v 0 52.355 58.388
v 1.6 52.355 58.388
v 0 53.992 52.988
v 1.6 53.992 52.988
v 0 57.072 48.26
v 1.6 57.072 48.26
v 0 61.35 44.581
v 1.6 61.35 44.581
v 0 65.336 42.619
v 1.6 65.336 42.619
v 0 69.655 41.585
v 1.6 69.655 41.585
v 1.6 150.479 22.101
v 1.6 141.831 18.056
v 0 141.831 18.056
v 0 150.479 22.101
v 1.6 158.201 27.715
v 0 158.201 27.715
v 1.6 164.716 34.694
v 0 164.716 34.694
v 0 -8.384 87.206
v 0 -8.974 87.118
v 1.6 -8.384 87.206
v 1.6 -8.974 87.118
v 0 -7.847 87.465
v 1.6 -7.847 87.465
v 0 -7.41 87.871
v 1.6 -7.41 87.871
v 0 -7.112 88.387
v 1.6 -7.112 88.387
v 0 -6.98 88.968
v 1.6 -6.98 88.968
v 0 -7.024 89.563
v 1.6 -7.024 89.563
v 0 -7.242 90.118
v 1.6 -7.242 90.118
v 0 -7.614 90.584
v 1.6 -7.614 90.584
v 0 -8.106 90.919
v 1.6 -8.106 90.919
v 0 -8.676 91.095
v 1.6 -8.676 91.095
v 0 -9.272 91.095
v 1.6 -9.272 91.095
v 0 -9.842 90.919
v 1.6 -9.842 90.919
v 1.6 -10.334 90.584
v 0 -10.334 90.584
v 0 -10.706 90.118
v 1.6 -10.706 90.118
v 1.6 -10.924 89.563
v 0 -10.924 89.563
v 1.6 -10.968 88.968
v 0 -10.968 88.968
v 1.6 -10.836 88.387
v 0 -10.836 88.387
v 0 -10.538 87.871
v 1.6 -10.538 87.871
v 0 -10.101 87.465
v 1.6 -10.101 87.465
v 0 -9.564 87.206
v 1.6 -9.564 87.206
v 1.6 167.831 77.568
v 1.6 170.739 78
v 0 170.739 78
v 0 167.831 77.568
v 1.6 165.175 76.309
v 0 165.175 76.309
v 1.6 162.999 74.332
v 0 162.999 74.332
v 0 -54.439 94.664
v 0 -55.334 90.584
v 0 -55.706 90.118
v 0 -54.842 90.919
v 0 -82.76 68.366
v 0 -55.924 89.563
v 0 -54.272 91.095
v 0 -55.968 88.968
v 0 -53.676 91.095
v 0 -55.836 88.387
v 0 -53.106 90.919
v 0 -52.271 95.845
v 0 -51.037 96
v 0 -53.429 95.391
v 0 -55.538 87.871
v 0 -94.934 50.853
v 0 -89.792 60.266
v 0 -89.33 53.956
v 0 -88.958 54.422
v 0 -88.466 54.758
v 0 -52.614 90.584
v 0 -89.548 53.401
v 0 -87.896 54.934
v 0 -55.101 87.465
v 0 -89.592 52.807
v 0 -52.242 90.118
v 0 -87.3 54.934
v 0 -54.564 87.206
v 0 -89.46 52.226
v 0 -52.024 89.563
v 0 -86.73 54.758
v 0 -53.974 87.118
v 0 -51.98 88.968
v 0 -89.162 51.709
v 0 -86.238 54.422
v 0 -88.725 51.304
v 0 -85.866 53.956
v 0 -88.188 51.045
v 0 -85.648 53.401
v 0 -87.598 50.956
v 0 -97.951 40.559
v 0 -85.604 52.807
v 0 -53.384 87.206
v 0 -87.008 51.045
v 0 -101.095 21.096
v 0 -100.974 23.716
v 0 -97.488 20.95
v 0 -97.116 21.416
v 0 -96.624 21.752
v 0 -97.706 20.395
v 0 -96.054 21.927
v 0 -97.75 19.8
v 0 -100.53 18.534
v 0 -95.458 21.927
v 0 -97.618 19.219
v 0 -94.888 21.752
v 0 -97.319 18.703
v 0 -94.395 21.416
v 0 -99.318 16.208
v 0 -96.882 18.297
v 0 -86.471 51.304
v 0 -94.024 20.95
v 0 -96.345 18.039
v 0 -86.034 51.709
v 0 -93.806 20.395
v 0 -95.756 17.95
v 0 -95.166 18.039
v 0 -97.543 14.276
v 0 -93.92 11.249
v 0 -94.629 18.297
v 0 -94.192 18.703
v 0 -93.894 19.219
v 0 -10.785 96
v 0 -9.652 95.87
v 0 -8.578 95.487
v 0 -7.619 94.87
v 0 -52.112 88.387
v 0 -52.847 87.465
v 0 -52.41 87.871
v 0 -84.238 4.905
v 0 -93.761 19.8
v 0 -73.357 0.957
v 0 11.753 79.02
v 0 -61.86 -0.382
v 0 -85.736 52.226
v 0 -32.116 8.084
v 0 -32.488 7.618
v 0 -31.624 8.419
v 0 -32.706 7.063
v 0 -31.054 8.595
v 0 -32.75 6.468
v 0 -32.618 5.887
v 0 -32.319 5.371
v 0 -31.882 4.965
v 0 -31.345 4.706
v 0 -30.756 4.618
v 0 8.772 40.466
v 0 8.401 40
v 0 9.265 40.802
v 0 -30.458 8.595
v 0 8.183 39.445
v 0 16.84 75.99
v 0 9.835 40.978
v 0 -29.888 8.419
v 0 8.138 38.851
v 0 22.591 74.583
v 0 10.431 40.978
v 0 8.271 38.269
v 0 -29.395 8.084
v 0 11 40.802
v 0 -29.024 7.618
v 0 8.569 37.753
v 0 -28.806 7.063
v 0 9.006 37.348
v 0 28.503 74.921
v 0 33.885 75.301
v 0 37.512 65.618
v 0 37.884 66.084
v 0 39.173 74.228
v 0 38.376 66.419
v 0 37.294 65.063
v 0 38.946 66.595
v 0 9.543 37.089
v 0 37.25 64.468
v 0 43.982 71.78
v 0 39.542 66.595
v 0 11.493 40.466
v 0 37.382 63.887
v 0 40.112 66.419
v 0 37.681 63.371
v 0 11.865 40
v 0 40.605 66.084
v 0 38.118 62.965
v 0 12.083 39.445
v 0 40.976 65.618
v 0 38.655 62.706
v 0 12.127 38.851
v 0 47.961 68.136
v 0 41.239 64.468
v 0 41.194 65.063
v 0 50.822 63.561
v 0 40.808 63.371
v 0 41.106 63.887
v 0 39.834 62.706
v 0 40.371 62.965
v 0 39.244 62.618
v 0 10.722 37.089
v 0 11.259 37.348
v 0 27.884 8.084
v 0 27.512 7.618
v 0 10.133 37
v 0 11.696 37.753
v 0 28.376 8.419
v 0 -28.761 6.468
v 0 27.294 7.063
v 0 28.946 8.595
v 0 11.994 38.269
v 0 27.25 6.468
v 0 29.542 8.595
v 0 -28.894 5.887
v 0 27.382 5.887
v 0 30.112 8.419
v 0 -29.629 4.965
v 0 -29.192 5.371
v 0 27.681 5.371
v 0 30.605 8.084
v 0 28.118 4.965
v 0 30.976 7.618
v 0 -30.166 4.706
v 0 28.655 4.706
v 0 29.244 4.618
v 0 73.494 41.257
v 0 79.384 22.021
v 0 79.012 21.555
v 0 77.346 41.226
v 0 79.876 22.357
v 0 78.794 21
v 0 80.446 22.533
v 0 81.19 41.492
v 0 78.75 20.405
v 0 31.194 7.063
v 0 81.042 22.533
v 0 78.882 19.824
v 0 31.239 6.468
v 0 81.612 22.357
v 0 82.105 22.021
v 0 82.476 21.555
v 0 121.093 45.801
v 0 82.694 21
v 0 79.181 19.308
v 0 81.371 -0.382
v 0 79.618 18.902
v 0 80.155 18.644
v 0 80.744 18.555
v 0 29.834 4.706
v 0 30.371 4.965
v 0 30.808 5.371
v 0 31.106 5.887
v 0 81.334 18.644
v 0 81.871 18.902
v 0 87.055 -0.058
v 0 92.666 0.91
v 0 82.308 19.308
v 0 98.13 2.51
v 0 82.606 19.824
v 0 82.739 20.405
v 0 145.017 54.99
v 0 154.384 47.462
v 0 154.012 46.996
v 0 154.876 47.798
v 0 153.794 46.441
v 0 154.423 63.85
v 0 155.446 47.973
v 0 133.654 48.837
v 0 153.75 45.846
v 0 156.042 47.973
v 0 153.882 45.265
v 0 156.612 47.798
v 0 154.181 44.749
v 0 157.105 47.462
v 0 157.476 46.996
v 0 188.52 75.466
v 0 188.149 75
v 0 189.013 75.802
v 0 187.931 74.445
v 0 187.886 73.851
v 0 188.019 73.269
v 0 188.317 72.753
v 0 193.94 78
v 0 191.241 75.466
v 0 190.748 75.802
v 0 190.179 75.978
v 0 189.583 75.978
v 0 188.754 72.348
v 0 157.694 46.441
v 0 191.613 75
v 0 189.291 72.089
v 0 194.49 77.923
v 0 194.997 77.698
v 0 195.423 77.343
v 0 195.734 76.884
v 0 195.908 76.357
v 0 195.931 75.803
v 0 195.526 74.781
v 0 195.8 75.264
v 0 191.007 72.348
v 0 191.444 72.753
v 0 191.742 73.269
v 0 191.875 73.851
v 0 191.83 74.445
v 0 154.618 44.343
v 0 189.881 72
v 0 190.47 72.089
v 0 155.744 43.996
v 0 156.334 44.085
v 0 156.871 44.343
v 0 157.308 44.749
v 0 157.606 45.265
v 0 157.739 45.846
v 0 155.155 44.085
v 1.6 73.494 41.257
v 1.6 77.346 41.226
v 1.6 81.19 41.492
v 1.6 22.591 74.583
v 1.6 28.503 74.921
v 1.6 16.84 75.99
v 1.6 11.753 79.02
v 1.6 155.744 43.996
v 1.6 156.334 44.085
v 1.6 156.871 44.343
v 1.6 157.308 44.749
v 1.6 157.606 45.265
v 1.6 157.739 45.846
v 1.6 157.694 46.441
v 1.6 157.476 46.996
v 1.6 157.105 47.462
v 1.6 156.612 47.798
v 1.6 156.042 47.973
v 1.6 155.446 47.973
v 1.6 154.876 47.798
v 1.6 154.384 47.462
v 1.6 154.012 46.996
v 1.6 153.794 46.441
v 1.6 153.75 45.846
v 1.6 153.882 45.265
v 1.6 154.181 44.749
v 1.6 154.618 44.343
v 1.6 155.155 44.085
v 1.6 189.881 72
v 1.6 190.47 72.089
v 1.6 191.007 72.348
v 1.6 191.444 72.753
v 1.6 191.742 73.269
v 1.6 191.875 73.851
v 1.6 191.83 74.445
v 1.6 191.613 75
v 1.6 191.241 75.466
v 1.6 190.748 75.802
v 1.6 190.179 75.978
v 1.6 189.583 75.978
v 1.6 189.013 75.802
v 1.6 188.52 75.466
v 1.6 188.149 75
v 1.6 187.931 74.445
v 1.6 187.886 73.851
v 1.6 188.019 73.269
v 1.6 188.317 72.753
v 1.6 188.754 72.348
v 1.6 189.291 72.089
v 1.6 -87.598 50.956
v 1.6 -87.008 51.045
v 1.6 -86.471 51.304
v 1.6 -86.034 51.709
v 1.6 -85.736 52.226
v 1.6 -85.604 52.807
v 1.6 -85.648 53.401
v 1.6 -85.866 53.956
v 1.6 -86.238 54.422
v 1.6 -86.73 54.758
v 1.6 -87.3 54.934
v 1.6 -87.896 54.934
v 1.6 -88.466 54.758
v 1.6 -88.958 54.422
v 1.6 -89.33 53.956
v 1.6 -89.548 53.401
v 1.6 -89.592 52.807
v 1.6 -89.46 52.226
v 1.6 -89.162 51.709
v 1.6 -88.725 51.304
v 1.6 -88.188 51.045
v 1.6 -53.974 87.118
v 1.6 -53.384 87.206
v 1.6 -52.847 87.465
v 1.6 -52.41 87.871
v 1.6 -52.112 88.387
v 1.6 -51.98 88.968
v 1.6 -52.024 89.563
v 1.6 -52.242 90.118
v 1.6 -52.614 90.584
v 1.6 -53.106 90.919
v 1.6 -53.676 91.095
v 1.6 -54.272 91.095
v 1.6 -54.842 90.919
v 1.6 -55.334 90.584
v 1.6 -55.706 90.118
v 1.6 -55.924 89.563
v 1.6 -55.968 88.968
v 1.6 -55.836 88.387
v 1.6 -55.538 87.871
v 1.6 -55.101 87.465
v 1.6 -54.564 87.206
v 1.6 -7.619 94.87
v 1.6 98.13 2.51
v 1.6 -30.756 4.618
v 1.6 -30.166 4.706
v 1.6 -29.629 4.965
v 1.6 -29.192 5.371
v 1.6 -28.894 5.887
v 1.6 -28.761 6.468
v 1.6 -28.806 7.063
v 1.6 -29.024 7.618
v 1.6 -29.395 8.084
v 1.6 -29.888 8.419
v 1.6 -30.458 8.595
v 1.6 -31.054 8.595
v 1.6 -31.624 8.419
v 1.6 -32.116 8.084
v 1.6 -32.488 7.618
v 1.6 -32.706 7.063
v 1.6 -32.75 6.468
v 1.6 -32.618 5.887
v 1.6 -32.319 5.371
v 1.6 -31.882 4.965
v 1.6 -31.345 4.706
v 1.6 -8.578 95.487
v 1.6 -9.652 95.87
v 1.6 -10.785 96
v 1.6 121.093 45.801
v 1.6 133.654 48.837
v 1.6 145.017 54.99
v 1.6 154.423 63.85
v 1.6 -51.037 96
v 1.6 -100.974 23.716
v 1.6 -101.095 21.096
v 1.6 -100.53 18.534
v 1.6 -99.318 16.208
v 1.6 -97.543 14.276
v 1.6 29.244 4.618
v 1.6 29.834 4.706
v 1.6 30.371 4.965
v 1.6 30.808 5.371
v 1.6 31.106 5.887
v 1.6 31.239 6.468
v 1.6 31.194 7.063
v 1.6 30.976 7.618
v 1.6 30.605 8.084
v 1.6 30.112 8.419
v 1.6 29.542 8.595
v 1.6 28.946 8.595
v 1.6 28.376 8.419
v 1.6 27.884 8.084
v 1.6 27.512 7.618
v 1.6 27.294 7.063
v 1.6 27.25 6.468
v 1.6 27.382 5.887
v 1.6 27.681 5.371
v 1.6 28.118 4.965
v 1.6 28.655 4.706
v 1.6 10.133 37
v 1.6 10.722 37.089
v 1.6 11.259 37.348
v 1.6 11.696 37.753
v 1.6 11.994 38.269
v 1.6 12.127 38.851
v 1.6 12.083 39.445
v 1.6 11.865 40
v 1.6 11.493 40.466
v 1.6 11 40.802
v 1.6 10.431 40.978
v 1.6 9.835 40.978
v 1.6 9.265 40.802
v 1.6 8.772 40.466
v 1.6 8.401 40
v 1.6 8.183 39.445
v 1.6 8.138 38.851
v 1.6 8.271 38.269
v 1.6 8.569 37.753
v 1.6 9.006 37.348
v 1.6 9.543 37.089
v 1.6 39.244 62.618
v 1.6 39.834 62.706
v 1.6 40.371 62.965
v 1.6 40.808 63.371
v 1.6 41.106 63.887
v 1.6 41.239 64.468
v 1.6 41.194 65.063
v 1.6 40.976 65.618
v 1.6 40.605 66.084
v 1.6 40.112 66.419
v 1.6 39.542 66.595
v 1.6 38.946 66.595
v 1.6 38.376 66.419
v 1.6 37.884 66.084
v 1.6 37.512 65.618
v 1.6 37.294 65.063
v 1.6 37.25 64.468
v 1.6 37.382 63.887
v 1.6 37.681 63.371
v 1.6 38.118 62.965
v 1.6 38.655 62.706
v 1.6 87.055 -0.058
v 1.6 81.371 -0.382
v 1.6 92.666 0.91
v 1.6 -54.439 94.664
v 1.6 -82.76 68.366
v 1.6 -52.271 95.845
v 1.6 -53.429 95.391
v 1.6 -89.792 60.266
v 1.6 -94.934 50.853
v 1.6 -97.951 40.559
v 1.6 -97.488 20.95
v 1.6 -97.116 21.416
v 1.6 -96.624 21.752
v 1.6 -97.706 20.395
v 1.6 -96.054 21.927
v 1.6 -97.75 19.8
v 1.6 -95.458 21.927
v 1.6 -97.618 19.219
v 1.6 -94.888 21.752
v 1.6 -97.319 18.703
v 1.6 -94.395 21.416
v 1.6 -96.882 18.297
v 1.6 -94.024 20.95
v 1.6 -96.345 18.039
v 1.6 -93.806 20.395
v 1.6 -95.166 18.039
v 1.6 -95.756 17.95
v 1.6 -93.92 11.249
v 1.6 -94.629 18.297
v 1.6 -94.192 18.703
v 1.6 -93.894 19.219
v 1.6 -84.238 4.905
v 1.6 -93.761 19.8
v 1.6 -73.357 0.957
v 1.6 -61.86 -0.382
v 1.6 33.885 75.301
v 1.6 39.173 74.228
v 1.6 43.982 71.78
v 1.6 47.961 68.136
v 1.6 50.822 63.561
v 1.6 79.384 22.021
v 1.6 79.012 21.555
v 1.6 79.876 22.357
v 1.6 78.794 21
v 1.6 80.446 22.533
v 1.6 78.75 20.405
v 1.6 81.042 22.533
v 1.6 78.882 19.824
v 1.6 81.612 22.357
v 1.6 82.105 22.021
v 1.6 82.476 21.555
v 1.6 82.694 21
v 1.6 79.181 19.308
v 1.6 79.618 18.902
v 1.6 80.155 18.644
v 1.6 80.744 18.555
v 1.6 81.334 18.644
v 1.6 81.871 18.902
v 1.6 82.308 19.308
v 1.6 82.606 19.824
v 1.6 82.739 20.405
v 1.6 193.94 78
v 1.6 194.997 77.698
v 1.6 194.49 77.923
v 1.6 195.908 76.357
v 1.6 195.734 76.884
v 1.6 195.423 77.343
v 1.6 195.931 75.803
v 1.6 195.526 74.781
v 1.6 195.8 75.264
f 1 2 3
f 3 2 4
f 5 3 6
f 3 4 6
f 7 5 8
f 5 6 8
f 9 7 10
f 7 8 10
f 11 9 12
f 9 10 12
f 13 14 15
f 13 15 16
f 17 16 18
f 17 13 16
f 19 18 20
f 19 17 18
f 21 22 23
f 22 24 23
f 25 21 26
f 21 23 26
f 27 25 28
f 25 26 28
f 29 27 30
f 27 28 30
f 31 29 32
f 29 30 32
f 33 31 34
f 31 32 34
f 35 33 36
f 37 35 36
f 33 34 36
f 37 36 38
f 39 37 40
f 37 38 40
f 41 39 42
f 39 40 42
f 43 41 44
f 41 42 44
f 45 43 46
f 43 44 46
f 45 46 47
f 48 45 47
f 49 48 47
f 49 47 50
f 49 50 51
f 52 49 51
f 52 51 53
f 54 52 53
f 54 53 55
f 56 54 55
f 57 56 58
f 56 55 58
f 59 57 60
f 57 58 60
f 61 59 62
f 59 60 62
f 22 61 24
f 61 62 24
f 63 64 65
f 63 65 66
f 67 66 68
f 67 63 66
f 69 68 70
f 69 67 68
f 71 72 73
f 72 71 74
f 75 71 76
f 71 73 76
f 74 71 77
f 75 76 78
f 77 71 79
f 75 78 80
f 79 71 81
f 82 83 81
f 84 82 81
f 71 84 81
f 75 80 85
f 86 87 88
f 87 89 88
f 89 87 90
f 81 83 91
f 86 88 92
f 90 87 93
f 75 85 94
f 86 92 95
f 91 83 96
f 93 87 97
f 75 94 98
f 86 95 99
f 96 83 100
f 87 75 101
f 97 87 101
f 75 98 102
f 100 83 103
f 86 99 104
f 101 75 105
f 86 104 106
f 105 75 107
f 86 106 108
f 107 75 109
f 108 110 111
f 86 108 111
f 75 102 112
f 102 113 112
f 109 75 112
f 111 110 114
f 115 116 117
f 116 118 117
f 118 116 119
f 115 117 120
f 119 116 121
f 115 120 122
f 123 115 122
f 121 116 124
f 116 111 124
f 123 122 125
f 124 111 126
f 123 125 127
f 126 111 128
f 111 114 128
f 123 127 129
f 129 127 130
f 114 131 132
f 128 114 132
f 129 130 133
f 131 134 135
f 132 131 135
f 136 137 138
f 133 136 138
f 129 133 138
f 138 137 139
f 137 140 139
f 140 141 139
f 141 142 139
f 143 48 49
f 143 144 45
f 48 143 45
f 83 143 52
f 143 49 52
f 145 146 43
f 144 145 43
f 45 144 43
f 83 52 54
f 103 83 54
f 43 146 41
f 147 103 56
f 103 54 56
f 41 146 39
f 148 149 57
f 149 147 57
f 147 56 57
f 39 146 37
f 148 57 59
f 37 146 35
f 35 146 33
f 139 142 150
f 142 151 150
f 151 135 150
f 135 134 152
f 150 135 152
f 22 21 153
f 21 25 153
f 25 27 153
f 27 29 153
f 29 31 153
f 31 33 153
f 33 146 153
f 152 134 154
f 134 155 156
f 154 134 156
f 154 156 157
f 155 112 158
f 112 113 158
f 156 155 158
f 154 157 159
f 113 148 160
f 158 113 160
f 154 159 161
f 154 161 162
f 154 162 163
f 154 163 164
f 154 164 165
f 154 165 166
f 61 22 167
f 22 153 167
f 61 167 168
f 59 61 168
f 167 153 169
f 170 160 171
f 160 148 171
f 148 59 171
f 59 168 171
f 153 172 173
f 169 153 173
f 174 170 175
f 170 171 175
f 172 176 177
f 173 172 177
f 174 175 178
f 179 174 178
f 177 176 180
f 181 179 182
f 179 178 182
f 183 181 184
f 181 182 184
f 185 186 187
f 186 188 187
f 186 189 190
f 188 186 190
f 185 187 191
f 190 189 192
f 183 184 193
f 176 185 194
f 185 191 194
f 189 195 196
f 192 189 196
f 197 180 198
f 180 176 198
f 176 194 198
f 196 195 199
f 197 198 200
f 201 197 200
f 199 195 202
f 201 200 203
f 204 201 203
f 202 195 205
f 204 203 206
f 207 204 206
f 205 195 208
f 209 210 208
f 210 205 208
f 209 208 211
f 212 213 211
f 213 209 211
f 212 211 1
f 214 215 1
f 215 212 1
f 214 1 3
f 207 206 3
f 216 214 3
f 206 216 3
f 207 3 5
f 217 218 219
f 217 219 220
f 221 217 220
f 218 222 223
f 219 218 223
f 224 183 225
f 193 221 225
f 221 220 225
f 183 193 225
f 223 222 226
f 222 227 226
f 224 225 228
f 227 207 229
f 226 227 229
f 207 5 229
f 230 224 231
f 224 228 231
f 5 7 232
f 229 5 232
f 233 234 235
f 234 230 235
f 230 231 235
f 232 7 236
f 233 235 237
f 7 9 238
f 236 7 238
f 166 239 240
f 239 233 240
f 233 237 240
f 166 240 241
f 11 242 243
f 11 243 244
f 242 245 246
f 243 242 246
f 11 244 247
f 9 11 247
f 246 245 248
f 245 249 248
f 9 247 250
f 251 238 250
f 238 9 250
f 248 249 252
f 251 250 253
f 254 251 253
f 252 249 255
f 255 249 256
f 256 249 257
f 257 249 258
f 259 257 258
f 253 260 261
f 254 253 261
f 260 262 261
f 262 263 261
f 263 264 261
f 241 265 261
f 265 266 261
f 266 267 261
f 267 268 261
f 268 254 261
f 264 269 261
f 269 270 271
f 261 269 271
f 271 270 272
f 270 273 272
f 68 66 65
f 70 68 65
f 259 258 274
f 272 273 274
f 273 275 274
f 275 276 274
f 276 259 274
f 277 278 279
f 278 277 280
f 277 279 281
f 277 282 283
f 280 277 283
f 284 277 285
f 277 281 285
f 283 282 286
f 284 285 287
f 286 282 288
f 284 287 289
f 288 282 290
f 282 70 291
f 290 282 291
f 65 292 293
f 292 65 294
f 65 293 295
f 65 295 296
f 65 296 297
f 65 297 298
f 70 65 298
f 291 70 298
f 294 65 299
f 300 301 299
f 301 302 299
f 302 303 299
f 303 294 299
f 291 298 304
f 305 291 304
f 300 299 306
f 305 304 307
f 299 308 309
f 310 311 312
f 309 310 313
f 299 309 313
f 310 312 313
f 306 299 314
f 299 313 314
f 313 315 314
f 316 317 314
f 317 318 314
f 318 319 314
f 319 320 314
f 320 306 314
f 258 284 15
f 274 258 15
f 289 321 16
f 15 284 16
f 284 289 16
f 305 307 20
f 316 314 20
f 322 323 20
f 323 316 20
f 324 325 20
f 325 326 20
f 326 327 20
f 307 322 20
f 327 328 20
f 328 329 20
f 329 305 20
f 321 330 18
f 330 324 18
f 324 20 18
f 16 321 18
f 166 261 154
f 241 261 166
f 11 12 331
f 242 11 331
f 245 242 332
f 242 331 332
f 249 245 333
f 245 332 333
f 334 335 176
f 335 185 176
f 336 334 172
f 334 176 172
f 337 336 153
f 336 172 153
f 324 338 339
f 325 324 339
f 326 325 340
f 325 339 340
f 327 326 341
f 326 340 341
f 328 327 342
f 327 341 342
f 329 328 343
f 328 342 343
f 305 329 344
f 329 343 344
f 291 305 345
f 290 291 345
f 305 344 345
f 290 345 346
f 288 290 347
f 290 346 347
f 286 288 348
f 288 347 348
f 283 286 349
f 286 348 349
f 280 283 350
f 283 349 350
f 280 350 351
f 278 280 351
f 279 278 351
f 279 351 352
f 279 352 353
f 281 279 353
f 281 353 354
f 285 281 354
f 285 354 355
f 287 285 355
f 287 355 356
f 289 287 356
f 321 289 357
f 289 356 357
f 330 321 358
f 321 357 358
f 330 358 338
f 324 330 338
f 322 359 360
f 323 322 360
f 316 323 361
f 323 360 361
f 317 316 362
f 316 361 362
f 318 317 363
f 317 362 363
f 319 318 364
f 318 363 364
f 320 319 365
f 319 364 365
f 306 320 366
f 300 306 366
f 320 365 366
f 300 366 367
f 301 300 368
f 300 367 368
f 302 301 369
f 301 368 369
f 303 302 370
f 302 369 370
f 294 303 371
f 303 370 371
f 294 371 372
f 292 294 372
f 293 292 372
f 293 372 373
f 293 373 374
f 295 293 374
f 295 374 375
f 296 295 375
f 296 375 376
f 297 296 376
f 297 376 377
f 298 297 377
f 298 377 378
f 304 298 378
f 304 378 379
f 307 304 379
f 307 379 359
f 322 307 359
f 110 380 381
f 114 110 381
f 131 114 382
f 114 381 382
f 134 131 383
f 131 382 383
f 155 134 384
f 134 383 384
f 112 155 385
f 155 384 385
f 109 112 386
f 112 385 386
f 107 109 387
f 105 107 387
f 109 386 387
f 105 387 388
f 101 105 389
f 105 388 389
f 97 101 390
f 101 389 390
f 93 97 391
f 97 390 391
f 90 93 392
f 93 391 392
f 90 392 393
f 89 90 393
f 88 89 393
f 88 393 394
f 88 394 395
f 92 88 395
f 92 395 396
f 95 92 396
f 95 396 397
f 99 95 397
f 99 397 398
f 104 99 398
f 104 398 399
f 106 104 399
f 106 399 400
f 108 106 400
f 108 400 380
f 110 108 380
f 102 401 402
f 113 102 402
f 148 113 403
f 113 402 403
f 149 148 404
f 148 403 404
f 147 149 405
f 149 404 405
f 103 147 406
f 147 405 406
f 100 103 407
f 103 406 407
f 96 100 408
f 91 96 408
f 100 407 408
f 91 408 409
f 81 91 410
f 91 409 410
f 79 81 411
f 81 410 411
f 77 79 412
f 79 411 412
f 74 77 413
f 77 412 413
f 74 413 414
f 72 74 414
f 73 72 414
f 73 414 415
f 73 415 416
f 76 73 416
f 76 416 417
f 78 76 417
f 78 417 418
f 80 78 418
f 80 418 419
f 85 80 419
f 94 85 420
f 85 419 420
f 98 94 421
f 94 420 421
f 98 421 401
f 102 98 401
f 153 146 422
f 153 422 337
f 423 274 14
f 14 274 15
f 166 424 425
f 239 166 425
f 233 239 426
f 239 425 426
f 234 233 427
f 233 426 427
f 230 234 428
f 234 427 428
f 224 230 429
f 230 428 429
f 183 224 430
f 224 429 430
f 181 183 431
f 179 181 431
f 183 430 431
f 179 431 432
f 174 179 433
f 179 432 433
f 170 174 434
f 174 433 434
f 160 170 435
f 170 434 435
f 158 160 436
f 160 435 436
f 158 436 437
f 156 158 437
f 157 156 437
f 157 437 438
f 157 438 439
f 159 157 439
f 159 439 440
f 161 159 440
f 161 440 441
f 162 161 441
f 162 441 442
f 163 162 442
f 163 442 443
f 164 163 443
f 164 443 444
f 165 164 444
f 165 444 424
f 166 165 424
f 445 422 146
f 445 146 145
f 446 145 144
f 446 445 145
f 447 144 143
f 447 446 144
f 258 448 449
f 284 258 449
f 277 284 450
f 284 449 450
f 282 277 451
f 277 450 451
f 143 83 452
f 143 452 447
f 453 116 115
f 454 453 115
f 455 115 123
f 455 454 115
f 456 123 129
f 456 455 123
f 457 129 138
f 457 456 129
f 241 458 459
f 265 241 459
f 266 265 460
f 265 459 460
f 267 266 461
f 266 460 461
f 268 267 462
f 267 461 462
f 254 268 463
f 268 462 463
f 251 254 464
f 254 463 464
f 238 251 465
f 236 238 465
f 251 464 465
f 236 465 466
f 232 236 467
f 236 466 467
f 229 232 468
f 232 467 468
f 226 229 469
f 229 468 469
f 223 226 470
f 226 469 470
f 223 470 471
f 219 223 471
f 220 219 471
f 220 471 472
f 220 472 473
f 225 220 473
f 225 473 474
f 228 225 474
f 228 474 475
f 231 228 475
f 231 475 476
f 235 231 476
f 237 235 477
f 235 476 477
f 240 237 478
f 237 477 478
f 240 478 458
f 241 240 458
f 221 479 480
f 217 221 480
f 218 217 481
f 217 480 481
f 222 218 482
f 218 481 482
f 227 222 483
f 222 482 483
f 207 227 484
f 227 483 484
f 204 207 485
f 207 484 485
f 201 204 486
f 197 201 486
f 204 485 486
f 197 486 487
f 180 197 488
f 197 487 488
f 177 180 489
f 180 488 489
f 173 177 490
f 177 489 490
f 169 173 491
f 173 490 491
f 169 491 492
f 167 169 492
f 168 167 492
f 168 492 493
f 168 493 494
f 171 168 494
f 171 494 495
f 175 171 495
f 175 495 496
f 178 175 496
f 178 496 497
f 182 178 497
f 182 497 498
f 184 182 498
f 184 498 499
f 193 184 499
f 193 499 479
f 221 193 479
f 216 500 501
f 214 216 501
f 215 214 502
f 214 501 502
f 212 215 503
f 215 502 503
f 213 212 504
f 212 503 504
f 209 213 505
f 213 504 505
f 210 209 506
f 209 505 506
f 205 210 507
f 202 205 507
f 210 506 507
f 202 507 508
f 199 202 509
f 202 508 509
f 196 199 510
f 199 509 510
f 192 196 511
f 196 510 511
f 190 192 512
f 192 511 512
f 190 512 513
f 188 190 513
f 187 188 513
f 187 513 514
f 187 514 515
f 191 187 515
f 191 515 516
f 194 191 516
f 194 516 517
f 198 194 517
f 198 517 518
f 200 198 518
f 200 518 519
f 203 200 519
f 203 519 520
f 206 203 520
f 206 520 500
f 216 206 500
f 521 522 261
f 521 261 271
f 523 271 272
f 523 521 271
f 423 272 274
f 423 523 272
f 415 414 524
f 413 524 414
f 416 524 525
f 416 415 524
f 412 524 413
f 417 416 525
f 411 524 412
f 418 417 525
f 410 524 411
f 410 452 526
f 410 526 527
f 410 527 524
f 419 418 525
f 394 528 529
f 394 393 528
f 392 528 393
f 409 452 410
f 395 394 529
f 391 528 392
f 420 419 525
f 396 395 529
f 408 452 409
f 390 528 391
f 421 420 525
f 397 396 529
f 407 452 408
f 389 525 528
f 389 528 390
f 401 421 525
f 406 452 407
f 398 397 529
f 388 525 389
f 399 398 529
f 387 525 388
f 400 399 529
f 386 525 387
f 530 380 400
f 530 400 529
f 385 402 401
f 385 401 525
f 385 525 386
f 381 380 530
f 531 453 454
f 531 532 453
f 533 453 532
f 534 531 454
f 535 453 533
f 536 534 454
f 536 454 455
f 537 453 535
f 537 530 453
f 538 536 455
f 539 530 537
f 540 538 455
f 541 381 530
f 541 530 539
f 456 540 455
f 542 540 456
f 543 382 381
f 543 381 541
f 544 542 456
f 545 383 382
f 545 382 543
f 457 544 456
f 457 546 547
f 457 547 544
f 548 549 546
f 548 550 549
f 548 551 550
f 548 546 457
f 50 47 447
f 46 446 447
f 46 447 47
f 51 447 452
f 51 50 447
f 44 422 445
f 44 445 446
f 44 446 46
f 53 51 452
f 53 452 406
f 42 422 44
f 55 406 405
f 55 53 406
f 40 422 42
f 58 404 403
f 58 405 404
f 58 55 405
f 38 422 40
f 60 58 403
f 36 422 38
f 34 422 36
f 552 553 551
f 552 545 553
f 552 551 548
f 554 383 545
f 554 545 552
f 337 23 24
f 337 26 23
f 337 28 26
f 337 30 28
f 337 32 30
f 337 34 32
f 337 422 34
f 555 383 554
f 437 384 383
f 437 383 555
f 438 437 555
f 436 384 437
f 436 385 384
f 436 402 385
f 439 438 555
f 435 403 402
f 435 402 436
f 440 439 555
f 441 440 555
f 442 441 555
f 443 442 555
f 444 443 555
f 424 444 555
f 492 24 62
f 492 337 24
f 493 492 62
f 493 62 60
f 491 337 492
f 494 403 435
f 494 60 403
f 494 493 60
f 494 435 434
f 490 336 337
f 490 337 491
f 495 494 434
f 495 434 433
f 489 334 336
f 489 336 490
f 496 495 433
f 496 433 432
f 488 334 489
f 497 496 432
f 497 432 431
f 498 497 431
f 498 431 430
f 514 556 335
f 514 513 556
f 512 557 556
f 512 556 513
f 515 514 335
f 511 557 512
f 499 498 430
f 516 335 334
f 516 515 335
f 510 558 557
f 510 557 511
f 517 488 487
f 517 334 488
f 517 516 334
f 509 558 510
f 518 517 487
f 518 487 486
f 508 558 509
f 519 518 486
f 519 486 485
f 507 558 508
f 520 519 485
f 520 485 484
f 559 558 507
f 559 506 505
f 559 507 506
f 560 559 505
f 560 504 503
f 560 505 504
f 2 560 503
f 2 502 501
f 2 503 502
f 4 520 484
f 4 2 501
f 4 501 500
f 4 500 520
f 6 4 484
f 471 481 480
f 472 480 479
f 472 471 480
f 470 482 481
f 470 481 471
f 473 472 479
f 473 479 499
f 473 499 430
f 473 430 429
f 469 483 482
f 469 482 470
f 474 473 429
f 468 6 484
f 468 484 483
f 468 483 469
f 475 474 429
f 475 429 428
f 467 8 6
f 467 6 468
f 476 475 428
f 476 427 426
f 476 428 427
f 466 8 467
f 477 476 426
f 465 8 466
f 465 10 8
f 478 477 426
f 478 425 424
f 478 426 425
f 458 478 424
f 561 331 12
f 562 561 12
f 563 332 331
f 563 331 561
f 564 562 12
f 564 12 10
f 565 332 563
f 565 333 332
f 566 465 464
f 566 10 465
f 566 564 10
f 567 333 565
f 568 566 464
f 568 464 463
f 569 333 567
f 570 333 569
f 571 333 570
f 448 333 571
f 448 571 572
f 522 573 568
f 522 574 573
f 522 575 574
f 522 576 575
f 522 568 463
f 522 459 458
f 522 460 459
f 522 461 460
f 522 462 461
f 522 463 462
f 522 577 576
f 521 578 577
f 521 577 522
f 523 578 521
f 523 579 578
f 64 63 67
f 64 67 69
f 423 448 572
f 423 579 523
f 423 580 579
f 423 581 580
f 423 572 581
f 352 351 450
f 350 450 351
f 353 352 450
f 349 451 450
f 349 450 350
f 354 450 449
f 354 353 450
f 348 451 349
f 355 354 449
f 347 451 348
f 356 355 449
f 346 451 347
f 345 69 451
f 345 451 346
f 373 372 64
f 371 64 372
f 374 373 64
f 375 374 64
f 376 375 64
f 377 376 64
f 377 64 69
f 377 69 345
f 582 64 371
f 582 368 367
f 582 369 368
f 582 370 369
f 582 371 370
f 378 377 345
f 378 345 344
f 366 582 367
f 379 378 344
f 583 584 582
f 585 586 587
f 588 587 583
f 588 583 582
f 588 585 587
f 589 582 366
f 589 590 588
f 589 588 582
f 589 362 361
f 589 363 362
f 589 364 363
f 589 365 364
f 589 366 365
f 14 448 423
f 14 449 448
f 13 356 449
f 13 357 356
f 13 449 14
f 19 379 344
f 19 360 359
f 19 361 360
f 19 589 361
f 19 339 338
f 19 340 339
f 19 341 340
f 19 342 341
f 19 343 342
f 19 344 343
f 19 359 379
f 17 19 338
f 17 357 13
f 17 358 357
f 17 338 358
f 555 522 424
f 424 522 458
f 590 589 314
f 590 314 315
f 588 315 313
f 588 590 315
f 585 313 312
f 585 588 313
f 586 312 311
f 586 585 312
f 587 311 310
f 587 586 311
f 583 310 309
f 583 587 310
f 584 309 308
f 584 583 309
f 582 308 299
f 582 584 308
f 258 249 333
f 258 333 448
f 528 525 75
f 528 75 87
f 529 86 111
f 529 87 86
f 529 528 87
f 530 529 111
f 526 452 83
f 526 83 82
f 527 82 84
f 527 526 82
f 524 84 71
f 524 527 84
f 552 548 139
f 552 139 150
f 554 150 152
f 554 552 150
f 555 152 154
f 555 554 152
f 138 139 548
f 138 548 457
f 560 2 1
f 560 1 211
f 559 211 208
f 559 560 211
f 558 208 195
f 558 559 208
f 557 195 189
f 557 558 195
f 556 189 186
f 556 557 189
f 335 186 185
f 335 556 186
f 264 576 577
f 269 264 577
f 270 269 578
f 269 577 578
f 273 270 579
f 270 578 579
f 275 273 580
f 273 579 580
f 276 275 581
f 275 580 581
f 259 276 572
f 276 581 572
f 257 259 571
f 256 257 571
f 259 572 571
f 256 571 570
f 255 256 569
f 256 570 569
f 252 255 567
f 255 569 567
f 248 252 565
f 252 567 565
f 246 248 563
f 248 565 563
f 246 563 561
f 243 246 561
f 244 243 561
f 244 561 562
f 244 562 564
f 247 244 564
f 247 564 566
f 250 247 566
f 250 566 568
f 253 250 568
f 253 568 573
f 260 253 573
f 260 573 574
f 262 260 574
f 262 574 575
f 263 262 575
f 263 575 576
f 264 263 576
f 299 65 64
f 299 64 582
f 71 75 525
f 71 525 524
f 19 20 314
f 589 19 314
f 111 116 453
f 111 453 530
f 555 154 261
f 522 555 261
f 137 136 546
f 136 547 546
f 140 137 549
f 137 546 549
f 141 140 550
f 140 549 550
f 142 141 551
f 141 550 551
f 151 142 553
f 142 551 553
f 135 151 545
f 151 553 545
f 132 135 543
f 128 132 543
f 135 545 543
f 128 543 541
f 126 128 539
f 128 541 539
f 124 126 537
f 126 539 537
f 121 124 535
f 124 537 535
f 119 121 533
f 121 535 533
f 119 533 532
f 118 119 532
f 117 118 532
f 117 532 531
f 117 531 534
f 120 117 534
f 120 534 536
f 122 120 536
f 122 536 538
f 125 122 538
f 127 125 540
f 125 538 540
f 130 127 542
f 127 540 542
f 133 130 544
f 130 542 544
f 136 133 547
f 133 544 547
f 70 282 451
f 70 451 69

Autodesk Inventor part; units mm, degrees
ref_plane "YZ Plane" through (0, 0, 0) normal (1, 0, 0) x (0, 1, 0)
ref_plane "XZ Plane" through (0, 0, 0) normal (0, 1, 0) x (-1, 0, 0)
ref_plane "XY Plane" through (0, 0, 0) normal (0, 0, 1) x (1, 0, 0)
sketch "Esquisse1" plane through (0, 0, 0) normal (1, 0, 0) x (0, 1, 0)
  line L0 (-80, -0.3825) -> (90, -0.3825)
  line L1 (90, -0.3825) -> (155.7273, 23)
  line L2 (155.7273, 23) -> (198, 78)
  line L3 (-80, -0.3825) -> (-102, 18)
  line L4 (-102, 18) -> (-95, 57)
  line L5 (-95, 57) -> (-53, 96)
  line L6 (-53, 96) -> (-9, 96)
  line L7 (-9, 96) -> (60.3686, 39.2438)
  line L8 (60.3686, 39.2438) -> (141.4545, 48)
  line L9 (141.4545, 48) -> (166, 78)
  line L10 (166, 78) -> (198, 78)
  point P0 (0, 0)
  dimension "d0" = 300
  dimension "d1" = 32
  dimension "d2" = 44
  dimension "d3" = 170
extrude "Extrusion1" add sketch "Esquisse1" along normal blind 1.6
fillet "Congé1" radius 50 6 edges at (0.8, -95, 57) (0.8, -80, -0.3825) (0.8, 60.3686, 39.2438) (0.8, 141.4545, 48) (0.8, 155.7273, 23) (0.8, 90, -0.3825)
fillet "Congé2" radius 10 1 edges at (0.8, -102, 18)
fillet "Congé3" radius 10 1 edges at (0.8, 166, 78)
fillet "Congé4" radius 2 1 edges at (0.8, 198, 78)
fillet "Congé5" radius 5 2 edges at (0.8, -9, 96) (0.8, -53, 96)
sketch "Esquisse2" plane through (1.6, 0, 0) normal (1, 0, 0) x (0, 0, -1)
  line L0 (-94.664, -54.4388) -> (-68.3658, -82.7599) projected
  arc A0 (-23.7165, -100.974) -> (-14.2761, -97.5432) centre (-21.9498, -91.1313) ccw projected
  line L1 (-14.2761, -97.5432) -> (-11.2486, -93.92) projected
  line L2 (0.3825, -61.8602) -> (0.3825, 81.3711) projected
  line L3 (-34.6945, 164.7156) -> (-74.7812, 195.5261) projected
  line L4 (-78, 193.9403) -> (-78, 170.7388) projected
  line L5 (-52.5054, 44.1601) -> (-94.8698, -7.6186) projected
  circle A1 centre (-89.1175, -53.974) radius 2
  circle A2 centre (-19.9498, -95.7558) radius 2
  circle A3 centre (-6.6175, -30.7558) radius 2
  circle A4 centre (-39, 10.1327) radius 2
  circle A5 centre (-20.5549, 80.7442) radius 2
  circle A6 centre (-45.9957, 155.7442) radius 2
  circle A7 centre (-6.6175, 29.2442) radius 2
  circle A8 centre (-74, 189.8806) radius 2
  line L6 (-40.5594, -97.9509) -> (-23.7165, -100.974) projected
  circle A9 centre (-52.9562, -87.598) radius 2
  circle A10 centre (-89.1175, -8.974) radius 2
  line L7 (-96, -10.7848) -> (-96, -51.0365) projected
  point P0 (-41.4923, 81.1901)
  point P1 (0, 0)
  dimension "d11" = 4
  dimension "d13" = 4
  dimension "d14" = 4
  dimension "d15" = 4
  dimension "d16" = 4
  dimension "d17" = 4
  dimension "d22" = 2
  dimension "d23" = 5.5
  dimension "d24" = 7
  dimension "d25" = 4
  dimension "d26" = 7
  dimension "d27" = 60
  dimension "d28" = 65
  dimension "d31" = 41.8748
  dimension "d32" = 20.9374
  dimension "d36" = 14
  dimension "d37" = 75
  dimension "d38" = 4
  dimension "d39" = 4
  dimension "d40" = 4
  dimension "d43" = 4
  dimension "d44" = 8
  dimension "d45" = 8
  dimension "d47" = 4
  dimension "d48" = 45
  dimension "d49" = 89.5
  dimension "d50" = 89.5
  dimension "d51" = 47
  dimension "d53" = 32
  dimension "d54" = 57
  dimension "d55" = 51.5
extrude "Extrusion2" cut sketch "Esquisse2" against normal blind 4
sketch "Esquisse4" plane through (1.6, 0, 0) normal (1, 0, 0) x (0, 0, -1)
  circle A0 centre (-20.5549, 80.7442) radius 2 projected
  line L0 (-52.5054, 44.1601) -> (-94.8698, -7.6186) projected
  arc A1 (-47.0739, 50.7986) -> (-71.5553, 20.8768) centre (-55.3427, 32.5879) ccw
  line L1 (-47.0739, 50.7986) -> (-71.5553, 20.8768)
  point P0 (-96, -10.7848)
  point P1 (0, 0)
  dimension "d62" = 40
  dimension "d63" = 40
  dimension "d64" = 20
extrude "Extrusion4" add sketch "Esquisse4" against normal blind 1.6 contours L0 A1 L1
fillet "Congé7" radius 20 2 edges at (0.8, 20.8768, 71.5553) (0.8, 51.09, 47.7484)
sketch "Esquisse5" plane through (1.6, 0, 0) normal (1, 0, 0) x (0, 0, -1)
  line L0 (0.3825, -61.8602) -> (0.3825, 81.3711) projected
  circle A0 centre (-19.9498, -95.7558) radius 2 projected
  circle A1 centre (-64.6175, 39.2442) radius 2
  point P0 (0, 0)
  dimension "d68" = 4
  dimension "d69" = 65
  dimension "d70" = 135
extrude "Extrusion5" cut sketch "Esquisse5" against normal through all contours A1
equation "\"d13\" = d11"
equation "\"d14\" = d11"
equation "\"d15\" = d11"
equation "\"d16\" = d11"
equation "\"d17\" = d11"
equation "\"d25\" = d11"
equation "\"d26\" = d24"
equation "\"d32\" = 0.5 * d31"
equation "\"d38\" = d11"
equation "\"d43\" = d11"
equation "\"d47\" = d11"
equation "\"d50\" = d49"
equation "\"d41\" = d43"
properties part number "Cote_Gauche" material "Fibre de verre - FR4"
